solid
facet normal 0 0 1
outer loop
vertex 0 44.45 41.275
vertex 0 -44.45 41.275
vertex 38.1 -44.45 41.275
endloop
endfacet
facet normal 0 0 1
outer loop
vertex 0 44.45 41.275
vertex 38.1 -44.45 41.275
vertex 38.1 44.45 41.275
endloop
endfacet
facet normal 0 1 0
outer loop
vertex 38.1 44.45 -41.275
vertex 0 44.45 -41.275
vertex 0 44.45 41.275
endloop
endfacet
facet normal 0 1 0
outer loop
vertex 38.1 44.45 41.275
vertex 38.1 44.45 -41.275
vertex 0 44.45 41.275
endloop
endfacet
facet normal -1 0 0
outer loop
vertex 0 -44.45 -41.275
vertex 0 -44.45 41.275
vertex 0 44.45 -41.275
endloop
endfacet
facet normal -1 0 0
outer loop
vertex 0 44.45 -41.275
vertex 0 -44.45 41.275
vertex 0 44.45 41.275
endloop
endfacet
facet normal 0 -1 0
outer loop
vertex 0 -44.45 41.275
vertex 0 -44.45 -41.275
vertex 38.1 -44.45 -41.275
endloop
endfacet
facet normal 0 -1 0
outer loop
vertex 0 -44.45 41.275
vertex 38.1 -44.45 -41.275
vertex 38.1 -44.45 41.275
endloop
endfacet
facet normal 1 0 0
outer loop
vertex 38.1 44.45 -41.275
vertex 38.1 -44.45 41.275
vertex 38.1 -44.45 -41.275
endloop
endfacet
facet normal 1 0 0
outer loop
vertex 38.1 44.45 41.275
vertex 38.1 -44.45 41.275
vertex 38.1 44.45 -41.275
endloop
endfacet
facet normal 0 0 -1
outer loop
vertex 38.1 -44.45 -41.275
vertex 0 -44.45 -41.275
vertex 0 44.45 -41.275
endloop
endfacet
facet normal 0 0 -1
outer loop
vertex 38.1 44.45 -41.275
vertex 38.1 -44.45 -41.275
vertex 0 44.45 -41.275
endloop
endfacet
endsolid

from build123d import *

# Parameters (mm, degrees)
F0_W     = 88.9
F0_H     = 38.1
F1_DEPTH = 82.55
F5_W     = 88.9
F5_H     = 82.55
F6_DEPTH = 38.1


with BuildPart() as f1:
    # F0 (on Top) → F1 (new body)
    with BuildSketch(Plane.XY):
        Rectangle(F0_W, F0_H)
    extrude(amount=F1_DEPTH)


with BuildPart() as f2_1:
    # F2: copy of F1
    add(f1.part)


with BuildPart() as f6:
    # F5 (on Right) → F6 (new body)
    with BuildSketch(Plane.YZ):
        Rectangle(F5_W, F5_H)
    extrude(amount=F6_DEPTH)


solid = f6.part
